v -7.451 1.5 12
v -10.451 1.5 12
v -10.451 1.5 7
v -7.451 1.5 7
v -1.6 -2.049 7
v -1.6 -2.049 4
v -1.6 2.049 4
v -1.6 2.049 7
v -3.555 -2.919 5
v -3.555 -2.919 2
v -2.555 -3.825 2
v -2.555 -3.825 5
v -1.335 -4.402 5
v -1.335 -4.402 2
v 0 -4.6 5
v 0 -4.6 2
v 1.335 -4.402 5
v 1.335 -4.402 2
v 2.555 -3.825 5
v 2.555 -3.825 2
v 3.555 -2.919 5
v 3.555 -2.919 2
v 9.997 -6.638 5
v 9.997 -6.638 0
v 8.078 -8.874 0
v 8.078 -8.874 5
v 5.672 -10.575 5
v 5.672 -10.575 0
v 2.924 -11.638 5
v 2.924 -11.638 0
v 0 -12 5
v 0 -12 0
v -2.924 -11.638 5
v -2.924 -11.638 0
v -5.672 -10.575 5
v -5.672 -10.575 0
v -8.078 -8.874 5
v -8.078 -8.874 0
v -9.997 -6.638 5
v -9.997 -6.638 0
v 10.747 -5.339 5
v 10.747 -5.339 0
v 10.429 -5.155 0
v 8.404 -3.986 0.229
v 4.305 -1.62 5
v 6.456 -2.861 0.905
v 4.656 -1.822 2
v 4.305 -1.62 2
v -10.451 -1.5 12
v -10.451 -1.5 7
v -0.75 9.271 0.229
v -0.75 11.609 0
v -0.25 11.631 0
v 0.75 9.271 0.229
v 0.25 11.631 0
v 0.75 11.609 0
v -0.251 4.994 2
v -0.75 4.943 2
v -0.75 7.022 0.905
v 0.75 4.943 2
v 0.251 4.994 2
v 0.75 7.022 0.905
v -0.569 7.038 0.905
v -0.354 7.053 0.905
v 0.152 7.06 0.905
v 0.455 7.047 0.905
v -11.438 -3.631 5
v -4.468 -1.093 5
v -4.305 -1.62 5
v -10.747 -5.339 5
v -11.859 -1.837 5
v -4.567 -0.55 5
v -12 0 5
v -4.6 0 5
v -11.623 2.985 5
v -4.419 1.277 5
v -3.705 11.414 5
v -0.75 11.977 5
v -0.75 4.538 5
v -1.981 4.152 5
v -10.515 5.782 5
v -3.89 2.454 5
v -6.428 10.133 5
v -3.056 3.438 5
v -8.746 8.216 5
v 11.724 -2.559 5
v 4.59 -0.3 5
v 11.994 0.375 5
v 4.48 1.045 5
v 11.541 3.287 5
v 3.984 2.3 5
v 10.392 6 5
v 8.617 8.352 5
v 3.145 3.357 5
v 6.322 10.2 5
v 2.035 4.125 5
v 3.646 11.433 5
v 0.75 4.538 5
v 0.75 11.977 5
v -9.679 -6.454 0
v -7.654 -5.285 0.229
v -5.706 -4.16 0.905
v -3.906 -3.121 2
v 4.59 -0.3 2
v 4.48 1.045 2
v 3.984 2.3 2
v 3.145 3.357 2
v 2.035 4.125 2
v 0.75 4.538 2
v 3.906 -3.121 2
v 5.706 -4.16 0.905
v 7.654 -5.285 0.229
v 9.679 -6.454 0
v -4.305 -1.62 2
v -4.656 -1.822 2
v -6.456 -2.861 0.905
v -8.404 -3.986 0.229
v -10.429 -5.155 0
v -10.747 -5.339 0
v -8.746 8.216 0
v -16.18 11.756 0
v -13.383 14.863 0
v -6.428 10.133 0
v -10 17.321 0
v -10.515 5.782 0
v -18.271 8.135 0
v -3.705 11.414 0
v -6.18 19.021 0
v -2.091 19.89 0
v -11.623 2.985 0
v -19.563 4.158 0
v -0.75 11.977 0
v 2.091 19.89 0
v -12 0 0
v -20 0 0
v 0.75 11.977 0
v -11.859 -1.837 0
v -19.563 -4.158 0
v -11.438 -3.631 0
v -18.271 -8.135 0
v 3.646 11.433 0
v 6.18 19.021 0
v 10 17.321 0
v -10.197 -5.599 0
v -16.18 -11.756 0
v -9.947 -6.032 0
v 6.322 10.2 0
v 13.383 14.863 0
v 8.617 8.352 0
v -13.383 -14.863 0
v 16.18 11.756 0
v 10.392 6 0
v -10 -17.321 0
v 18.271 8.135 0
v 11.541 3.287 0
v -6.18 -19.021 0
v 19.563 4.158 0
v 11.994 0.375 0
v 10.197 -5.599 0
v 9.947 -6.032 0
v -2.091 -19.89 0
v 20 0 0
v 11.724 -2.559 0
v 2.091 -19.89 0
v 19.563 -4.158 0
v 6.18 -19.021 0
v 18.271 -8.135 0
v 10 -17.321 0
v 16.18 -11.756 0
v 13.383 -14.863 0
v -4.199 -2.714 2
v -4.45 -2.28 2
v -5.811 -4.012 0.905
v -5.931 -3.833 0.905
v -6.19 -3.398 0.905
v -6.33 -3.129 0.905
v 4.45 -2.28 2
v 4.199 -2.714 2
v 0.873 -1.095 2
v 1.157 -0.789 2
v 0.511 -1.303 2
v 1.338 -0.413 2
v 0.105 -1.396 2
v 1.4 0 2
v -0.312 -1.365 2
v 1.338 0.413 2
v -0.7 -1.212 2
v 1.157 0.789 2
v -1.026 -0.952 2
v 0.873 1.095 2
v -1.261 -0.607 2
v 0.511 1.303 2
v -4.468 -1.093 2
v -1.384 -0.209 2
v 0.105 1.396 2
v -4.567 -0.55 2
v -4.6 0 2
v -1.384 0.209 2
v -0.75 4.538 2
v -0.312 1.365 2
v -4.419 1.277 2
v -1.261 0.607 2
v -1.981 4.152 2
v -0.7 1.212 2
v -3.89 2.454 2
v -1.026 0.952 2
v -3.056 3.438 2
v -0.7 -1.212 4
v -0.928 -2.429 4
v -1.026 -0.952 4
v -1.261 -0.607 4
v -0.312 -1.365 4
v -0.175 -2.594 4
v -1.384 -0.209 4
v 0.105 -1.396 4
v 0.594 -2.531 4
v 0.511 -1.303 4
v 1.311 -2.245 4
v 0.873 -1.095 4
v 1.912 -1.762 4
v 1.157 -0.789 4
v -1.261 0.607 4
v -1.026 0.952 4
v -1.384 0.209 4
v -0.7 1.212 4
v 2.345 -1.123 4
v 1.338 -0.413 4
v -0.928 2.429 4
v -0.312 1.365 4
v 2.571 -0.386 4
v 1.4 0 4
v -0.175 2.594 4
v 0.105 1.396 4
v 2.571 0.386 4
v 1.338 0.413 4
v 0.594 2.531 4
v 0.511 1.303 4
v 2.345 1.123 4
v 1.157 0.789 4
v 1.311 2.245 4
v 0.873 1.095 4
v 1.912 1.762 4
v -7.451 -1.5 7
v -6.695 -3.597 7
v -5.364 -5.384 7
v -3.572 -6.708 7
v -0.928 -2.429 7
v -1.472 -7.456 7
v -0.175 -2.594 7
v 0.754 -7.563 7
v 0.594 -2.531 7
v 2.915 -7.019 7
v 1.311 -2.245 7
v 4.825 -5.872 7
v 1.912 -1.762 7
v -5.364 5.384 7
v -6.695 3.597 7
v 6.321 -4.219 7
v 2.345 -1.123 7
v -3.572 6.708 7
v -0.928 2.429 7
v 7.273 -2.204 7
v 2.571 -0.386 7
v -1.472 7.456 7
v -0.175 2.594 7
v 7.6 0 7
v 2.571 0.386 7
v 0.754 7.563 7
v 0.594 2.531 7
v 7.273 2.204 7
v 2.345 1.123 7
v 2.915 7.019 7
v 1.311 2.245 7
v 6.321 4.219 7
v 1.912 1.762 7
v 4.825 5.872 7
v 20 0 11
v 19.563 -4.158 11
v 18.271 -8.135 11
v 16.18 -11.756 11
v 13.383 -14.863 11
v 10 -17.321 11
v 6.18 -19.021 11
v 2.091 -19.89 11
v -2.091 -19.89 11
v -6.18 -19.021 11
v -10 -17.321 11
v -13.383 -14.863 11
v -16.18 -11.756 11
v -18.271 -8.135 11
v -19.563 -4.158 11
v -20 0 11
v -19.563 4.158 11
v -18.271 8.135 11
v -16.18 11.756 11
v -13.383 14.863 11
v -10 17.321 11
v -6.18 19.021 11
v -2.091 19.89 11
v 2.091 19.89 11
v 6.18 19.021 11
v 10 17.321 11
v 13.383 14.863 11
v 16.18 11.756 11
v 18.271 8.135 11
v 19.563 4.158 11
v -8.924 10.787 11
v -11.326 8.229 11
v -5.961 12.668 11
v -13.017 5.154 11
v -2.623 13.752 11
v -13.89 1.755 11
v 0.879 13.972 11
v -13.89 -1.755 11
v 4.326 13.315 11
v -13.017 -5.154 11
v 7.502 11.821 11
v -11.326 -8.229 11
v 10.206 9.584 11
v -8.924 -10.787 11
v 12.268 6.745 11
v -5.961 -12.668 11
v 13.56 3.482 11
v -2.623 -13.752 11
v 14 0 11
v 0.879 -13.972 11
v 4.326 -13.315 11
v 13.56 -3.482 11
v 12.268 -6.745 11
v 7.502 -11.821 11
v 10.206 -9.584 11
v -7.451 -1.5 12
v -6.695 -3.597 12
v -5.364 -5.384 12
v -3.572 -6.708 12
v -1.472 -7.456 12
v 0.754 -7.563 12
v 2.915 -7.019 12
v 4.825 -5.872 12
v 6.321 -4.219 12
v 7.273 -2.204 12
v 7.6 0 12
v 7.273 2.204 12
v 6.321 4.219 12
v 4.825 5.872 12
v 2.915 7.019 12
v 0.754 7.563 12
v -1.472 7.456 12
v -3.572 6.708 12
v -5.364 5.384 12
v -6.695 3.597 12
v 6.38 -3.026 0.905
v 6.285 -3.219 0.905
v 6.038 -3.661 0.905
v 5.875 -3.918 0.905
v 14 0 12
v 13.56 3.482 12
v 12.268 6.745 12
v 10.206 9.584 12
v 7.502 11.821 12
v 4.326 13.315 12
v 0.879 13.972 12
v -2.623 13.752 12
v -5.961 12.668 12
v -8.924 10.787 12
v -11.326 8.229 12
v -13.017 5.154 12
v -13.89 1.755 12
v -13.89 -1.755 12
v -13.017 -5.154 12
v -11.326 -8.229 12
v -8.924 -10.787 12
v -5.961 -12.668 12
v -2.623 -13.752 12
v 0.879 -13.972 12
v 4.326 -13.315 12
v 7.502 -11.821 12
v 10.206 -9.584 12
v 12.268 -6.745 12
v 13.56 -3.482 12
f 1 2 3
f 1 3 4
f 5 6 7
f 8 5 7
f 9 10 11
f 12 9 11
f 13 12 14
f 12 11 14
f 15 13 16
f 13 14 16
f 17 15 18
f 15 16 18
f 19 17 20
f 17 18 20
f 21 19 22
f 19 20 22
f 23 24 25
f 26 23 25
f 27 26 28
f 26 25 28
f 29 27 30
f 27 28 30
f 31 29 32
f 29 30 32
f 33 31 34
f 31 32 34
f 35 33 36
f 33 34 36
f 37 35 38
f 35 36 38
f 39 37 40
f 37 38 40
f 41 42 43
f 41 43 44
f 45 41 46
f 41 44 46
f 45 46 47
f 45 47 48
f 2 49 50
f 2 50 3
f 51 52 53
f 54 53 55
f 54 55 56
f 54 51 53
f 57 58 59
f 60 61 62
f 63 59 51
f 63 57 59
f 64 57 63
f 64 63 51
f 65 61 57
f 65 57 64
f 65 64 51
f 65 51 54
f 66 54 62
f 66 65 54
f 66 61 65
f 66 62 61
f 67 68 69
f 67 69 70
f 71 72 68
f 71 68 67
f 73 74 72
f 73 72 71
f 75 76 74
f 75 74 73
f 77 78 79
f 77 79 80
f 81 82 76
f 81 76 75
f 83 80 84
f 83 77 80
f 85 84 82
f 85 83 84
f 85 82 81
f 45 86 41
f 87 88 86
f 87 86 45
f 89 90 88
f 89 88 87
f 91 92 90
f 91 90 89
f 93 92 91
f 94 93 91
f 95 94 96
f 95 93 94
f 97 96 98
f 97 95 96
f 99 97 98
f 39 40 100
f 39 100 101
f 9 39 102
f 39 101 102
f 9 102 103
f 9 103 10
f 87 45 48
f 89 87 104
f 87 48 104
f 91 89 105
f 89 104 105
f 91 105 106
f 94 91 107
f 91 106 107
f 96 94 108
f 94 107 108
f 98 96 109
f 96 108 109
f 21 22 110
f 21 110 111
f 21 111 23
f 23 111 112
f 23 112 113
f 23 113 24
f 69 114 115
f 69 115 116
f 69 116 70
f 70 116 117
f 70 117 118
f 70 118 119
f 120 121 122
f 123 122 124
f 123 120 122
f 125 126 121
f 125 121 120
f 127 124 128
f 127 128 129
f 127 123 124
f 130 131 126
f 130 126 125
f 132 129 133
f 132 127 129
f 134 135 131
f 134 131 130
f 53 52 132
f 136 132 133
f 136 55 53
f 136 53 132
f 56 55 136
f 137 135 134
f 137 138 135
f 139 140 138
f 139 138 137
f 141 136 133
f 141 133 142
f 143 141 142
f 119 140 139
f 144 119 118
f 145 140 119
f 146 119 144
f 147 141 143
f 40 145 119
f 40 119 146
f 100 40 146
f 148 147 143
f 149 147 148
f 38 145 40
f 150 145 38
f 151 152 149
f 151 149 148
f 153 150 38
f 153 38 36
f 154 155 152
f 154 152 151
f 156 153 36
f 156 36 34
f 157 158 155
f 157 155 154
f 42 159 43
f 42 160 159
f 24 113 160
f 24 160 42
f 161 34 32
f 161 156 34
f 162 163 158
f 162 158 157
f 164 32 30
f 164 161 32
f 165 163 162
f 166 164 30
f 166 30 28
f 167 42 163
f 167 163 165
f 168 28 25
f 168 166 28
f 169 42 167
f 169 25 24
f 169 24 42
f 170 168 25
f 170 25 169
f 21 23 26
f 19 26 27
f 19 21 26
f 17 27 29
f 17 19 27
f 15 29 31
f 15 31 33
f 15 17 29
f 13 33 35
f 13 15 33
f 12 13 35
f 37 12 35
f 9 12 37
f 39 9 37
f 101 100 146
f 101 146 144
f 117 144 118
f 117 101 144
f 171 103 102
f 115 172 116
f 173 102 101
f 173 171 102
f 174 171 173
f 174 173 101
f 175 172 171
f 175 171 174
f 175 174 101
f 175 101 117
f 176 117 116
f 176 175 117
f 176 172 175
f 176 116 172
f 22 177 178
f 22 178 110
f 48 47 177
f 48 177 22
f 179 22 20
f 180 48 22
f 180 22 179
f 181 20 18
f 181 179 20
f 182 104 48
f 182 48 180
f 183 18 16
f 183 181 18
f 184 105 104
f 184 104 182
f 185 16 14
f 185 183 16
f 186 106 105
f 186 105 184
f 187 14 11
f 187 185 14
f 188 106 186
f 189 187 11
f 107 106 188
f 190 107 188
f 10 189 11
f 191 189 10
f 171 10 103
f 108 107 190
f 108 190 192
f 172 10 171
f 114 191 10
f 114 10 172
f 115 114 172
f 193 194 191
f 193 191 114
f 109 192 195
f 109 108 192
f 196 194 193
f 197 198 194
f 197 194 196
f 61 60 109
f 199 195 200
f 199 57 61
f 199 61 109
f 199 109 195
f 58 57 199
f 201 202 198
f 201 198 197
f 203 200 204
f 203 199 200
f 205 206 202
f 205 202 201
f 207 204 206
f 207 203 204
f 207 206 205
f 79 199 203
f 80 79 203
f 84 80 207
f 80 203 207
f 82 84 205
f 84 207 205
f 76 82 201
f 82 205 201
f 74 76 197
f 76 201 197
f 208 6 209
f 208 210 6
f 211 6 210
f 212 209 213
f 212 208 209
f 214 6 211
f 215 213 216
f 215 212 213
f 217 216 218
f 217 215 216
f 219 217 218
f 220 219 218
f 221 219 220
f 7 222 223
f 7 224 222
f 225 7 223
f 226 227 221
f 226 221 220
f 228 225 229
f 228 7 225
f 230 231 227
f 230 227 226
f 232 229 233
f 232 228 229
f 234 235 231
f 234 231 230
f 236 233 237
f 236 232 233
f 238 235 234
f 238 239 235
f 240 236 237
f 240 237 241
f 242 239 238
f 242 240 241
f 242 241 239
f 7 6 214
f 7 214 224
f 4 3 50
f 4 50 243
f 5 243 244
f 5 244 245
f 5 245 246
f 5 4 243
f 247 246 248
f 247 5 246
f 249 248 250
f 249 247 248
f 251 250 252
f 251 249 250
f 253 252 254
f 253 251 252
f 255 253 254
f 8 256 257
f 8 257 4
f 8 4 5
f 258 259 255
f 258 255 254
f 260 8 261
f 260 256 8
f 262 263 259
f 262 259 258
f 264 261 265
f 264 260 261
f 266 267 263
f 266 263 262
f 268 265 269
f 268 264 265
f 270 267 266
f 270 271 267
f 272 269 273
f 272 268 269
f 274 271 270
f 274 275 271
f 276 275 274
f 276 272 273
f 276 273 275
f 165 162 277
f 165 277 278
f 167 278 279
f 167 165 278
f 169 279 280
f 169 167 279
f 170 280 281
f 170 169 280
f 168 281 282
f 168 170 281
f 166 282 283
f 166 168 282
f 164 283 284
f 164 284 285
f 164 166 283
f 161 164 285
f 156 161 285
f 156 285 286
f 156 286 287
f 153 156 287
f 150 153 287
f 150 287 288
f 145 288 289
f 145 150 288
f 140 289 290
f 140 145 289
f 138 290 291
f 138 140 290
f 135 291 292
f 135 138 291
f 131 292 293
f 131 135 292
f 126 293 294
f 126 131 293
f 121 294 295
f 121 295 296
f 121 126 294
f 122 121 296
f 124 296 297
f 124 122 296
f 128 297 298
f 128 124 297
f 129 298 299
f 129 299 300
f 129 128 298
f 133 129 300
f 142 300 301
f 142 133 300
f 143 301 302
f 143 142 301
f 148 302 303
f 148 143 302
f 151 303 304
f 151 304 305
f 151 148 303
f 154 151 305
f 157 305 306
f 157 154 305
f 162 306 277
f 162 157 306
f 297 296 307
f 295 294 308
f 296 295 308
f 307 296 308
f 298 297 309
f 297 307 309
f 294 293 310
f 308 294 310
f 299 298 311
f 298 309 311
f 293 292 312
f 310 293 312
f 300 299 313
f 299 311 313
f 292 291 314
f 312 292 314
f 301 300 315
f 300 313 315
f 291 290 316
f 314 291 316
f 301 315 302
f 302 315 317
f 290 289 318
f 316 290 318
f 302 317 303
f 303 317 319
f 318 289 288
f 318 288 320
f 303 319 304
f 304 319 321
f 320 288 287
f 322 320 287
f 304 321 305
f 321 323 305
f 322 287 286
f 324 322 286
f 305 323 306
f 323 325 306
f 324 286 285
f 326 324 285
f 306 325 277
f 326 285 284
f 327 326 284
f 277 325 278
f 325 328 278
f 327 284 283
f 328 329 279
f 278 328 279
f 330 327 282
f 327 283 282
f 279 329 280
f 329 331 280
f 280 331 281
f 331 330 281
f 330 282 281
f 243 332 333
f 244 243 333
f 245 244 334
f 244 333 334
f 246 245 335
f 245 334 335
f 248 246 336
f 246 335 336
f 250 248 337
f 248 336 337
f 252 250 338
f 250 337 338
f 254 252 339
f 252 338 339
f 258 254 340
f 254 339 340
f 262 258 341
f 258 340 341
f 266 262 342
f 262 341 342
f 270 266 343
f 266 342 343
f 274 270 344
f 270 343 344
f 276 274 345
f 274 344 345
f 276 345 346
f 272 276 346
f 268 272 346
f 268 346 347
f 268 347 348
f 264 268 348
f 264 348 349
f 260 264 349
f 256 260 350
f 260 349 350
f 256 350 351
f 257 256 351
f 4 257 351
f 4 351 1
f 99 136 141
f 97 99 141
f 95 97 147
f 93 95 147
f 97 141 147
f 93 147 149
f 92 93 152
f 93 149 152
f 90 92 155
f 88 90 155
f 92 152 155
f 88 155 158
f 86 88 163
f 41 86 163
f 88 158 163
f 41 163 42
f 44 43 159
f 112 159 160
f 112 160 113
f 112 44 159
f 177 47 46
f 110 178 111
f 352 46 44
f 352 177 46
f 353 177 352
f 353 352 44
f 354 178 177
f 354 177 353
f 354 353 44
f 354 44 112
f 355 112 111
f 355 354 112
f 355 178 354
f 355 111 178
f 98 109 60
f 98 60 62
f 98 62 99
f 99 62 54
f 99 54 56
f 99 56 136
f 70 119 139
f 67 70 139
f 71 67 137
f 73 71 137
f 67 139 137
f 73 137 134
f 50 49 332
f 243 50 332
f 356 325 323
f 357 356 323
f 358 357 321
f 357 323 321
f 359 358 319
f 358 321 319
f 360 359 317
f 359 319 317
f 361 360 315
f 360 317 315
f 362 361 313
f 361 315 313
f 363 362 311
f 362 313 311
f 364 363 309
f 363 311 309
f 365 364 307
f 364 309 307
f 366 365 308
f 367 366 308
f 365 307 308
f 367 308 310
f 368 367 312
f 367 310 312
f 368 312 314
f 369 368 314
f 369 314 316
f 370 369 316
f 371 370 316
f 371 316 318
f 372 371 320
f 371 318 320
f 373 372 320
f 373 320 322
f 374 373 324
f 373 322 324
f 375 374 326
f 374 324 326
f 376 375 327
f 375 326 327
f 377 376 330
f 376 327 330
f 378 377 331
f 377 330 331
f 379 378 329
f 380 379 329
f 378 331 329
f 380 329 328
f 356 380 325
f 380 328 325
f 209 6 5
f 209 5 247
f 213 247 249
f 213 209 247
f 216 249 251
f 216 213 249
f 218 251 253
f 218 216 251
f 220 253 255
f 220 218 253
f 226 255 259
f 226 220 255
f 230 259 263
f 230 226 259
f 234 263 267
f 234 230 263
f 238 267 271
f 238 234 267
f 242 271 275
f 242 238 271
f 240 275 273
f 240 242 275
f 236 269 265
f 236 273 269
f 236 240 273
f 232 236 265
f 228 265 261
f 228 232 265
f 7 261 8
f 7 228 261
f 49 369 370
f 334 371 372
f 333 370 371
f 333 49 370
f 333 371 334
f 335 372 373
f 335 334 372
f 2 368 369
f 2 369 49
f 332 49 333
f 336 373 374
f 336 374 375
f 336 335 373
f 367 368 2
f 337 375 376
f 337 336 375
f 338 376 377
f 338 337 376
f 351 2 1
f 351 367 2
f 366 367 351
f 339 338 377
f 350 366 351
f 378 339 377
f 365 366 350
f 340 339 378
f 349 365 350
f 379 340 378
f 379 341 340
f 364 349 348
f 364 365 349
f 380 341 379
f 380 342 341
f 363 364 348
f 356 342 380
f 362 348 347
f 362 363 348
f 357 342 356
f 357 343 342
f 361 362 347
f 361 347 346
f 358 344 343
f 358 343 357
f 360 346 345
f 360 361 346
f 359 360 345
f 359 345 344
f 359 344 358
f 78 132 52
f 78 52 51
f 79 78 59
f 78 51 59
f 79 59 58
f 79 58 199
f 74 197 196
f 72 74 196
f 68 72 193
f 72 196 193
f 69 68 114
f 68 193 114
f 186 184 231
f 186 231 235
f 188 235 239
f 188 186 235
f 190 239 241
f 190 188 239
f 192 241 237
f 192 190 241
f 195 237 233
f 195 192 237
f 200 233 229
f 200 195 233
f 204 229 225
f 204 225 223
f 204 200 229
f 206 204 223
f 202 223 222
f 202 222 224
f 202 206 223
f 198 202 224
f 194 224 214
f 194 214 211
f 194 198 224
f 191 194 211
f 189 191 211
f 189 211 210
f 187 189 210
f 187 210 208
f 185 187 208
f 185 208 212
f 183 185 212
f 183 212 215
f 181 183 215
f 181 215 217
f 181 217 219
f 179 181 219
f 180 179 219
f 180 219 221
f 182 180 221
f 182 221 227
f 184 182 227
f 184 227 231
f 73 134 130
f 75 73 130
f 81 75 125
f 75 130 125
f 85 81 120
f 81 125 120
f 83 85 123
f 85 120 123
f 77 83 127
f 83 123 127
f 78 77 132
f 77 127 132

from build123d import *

# Parameters (mm, degrees)
SKETCH_1_R          = 13
SKETCH_1_R_2        = 2.6
SKETCH_1_R_3        = 1.4
EXTRUDE_1_DEPTH     = 4
SKETCH_1_3_R        = 13
SKETCH_1_3_R_2      = 2.6
EXTRUDE_2_DEPTH     = 12
EXTRUDE_START       = 11
SKETCH_1_6_R        = 14
SKETCH_1_6_R_2      = 13
EXTRUDE_3_DEPTH     = 1
CUT_EXTRUDE_1_DEPTH = 5
SKETCH_6_R          = 7.6
SKETCH_6_W          = 3
SKETCH_6_H          = 3
CUT_EXTRUDE_5_DEPTH = 5
SKETCH_5_R          = 5
CUT_EXTRUDE_6_DEPTH = 2
FILLET_1_R          = 12
SKETCH_7_R          = 20
SKETCH_7_R_2        = 13
EXTRUDE_5_DEPTH     = 11


with BuildPart() as part:
    # 草图1 → 凸台-拉伸1 (new body)
    # profile 1 of 3: a face of its own
    with BuildSketch(Plane.XY):
        Circle(SKETCH_1_R)
        Circle(SKETCH_1_R_2, mode=Mode.SUBTRACT)
    # profile 2 of 3: a face of its own
    with BuildSketch(Plane.XY):
        with BuildLine():
            Line((-1.6, -2.049390153), (-1.6, 2.049390153))
            ThreePointArc((-1.6, 2.049390153), (-2.6, 0), (-1.6, -2.049390153))
        make_face()
    # profile 3 of 3: a face of its own
    with BuildSketch(Plane.XY):
        with BuildLine():
            ThreePointArc((2.6, 0), (1.140175425, 2.336664289), (-1.6, 2.049390153))
            Line((-1.6, 2.049390153), (-1.6, -2.049390153))
            ThreePointArc((-1.6, -2.049390153), (1.140175425, -2.336664289), (2.6, 0))
        make_face()
        Circle(SKETCH_1_R_3, mode=Mode.SUBTRACT)
    extrude(amount=EXTRUDE_1_DEPTH)

    # 草图1<3> → 凸台-拉伸2 (add)
    # profile 1 of 2: a face of its own
    with BuildSketch(Plane.XY):
        Circle(SKETCH_1_3_R)
        Circle(SKETCH_1_3_R_2, mode=Mode.SUBTRACT)
    # profile 2 of 2: a face of its own
    with BuildSketch(Plane.XY):
        with BuildLine():
            Line((-1.6, -2.049390153), (-1.6, 2.049390153))
            ThreePointArc((-1.6, 2.049390153), (-2.6, 0), (-1.6, -2.049390153))
        make_face()
    extrude(amount=EXTRUDE_2_DEPTH)

    # 草图1<6> → 凸台-拉伸3 (add)
    with BuildSketch(Plane.XY.offset(EXTRUDE_START)):
        Circle(SKETCH_1_6_R)
        Circle(SKETCH_1_6_R_2, mode=Mode.SUBTRACT)
    extrude(amount=EXTRUDE_3_DEPTH)

    # 草图3 → 切除-拉伸1 (cut)
    with BuildSketch(Plane(origin=(0, 0, 0), x_dir=(-1, 0, 0), z_dir=(0, 0, -1))):
        with BuildLine():
            Line((-10.746987514, -5.338750731), (-4.305410284, -1.619704383))
            ThreePointArc((-4.305410284, -1.619704383), (-3.983716857, 2.3), (-0.75, 4.538446871))
            Line((-0.75, 4.538446871), (-0.75, 11.976539567))
            ThreePointArc((-0.75, 11.976539567), (-10.392304845, 6), (-10.746987514, -5.338750731))
        make_face()
        with BuildLine():
            Line((9.996987514, -6.637788836), (3.555410284, -2.918742488))
            ThreePointArc((3.555410284, -2.918742488), (0, -4.6), (-3.555410284, -2.918742488))
            Line((-3.555410284, -2.918742488), (-9.996987514, -6.637788836))
            ThreePointArc((-9.996987514, -6.637788836), (0, -12), (9.996987514, -6.637788836))
        make_face()
        with BuildLine():
            ThreePointArc((4.6, 0), (4.52575338, -0.823138109), (4.305410284, -1.619704383))
            Line((4.305410284, -1.619704383), (10.746987514, -5.338750731))
            ThreePointArc((10.746987514, -5.338750731), (11.682547885, -2.741910814), (12, 0))
            ThreePointArc((12, 0), (8.746427842, 8.215838363), (0.75, 11.976539567))
            Line((0.75, 11.976539567), (0.75, 4.538446871))
            ThreePointArc((0.75, 4.538446871), (3.507848343, 2.975735203), (4.6, 0))
        make_face()
    extrude(amount=-CUT_EXTRUDE_1_DEPTH, mode=Mode.SUBTRACT)

    # 草图6 → 切除-拉伸5 (cut)
    with BuildSketch(Plane.XY.offset(12)):
        Circle(SKETCH_6_R)
        with Locations((-8.950503339, 0)):
            Rectangle(SKETCH_6_W, SKETCH_6_H)
    extrude(amount=-CUT_EXTRUDE_5_DEPTH, mode=Mode.SUBTRACT)

    # 草图5 → 切除-拉伸6 (cut)
    with BuildSketch(Plane(origin=(0, 0, 0), x_dir=(-1, 0, 0), z_dir=(0, 0, -1))):
        Circle(SKETCH_5_R)
    extrude(amount=-CUT_EXTRUDE_6_DEPTH, mode=Mode.SUBTRACT)

    # 圆角1
    # the kernel refuses this fillet: 12 mm, written as the material it takes off along each edge
    with BuildSketch(Plane(origin=(0, 0, 0), x_dir=(-0.0031415874858860904, -0.9999950652018581, 0), z_dir=(0.9999950652018581, -0.0031415874858860904, 0))) as fillet_1_piece_1:
        with BuildLine():
            CenterArc((11.633249581, -12), FILLET_1_R, 90, 33.557309762)
            Line((5, -2), (5, 0))
            Line((5, 0), (11.633249581, 0))
        make_face()
    revolve(axis=Axis((0, 0, 0), (0, 0, -1)), revolution_arc=359.64, mode=Mode.SUBTRACT)
    with BuildSketch(Plane(origin=(0, 0, 0), x_dir=(0.8675919238668026, 0.49727683802998507, 0), z_dir=(-0.49727683802998507, 0.8675919238668026, 0))) as fillet_1_piece_2:
        with BuildLine():
            CenterArc((11.633249581, -12), FILLET_1_R, 90, 33.557309762)
            Line((5, -2), (5, 0))
            Line((5, 0), (11.633249581, 0))
        make_face()
    revolve(axis=Axis((0, 0, 0), (0, 0, -1)), revolution_arc=359.64, mode=Mode.SUBTRACT)
    with BuildSketch(Plane(origin=(0, 0, 0), x_dir=(-0.8644503363809427, 0.5027182271719167, 0), z_dir=(-0.5027182271719167, -0.8644503363809427, 0))) as fillet_1_piece_3:
        with BuildLine():
            CenterArc((11.633249581, -12), FILLET_1_R, 90, 33.557309762)
            Line((5, -2), (5, 0))
            Line((5, 0), (11.633249581, 0))
        make_face()
    revolve(axis=Axis((0, 0, 0), (0, 0, -1)), revolution_arc=359.64, mode=Mode.SUBTRACT)

    # 草图7 → 凸台-拉伸5 (add)
    with BuildSketch(Plane(origin=(0, 0, 11), x_dir=(-1, 0, 0), z_dir=(0, 0, -1)).offset(EXTRUDE_START)):
        with Locations(Location((0, 0, 0), (0, 0, 180))):
            Circle(SKETCH_7_R)
        Circle(SKETCH_7_R_2, mode=Mode.SUBTRACT)
    extrude(amount=-EXTRUDE_5_DEPTH)


solid = part.part
